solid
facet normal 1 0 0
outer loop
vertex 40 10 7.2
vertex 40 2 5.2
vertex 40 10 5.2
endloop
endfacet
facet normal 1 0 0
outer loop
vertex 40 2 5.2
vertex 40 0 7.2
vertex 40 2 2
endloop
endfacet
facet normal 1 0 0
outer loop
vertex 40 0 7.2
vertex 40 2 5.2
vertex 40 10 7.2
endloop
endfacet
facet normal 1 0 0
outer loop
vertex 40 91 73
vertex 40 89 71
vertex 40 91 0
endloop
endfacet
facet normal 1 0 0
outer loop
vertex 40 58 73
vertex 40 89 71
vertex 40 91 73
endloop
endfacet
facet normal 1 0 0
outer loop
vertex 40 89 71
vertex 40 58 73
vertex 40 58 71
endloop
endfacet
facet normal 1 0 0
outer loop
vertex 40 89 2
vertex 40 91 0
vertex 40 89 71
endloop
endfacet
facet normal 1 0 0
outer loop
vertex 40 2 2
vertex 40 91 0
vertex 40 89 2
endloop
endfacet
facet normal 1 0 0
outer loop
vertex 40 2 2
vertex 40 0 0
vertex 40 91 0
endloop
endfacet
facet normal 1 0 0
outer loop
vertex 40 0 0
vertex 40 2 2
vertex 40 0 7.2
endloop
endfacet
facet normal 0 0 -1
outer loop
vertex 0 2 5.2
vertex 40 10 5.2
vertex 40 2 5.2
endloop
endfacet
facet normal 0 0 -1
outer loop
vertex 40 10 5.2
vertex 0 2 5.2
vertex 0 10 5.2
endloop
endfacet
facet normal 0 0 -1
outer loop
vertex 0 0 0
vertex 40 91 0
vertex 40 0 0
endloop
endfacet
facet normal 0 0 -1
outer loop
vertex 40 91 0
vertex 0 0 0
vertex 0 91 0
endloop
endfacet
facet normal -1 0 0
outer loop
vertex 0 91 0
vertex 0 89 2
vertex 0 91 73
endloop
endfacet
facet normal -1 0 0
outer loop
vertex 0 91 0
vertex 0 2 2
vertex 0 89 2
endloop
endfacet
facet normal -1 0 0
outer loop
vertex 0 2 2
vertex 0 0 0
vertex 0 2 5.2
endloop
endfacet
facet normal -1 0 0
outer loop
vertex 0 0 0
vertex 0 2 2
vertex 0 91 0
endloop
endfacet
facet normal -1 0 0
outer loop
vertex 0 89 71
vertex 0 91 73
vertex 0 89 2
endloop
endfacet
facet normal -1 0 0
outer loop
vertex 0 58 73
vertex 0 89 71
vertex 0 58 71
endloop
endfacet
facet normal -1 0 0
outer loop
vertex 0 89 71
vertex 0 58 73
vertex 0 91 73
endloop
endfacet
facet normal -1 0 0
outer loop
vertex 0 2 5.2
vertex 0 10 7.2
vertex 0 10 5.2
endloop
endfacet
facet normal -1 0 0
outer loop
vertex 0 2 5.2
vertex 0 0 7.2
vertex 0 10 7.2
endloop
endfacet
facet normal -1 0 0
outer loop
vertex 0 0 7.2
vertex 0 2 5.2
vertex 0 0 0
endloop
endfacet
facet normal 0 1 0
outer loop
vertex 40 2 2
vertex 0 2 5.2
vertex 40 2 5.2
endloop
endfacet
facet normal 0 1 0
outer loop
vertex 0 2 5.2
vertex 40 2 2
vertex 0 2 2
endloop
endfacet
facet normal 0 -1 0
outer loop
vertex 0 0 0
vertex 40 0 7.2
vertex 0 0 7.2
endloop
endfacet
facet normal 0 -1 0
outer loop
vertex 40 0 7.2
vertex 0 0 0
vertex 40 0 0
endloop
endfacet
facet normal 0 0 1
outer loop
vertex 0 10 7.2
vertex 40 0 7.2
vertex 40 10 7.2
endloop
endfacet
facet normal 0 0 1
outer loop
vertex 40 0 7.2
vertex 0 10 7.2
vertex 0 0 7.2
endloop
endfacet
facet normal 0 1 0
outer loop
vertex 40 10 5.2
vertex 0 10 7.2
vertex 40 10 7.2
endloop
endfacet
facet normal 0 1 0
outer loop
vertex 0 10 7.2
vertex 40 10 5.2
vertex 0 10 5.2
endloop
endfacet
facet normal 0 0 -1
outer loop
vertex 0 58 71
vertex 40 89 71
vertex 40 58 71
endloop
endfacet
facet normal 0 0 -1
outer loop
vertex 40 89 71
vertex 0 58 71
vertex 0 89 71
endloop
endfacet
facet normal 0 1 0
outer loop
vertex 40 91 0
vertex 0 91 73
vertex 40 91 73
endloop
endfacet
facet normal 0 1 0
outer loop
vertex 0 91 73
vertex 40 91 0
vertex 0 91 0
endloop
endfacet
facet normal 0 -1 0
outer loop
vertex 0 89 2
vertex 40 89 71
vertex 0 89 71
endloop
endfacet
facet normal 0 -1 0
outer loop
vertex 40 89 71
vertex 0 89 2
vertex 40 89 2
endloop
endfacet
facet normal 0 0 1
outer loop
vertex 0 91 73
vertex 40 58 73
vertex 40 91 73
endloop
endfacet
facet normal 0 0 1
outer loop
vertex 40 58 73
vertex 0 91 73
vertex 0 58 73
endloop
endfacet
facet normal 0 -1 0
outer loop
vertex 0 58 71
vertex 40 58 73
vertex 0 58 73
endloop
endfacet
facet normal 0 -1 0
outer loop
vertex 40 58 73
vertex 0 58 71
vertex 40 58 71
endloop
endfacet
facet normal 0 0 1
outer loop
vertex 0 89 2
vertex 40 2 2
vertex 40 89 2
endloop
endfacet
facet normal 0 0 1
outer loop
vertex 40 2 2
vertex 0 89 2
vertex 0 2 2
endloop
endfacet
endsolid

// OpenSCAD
// Render Control
$fa = 1;
$fs = 0.4;

// Dimensions
width = 40;
height = 87;
depth_plate = 2;
depth_front = 5.2;
depth_rear = 71;
overhang_rear = 31;
overhang_front = 10;

// Modules
module base() {
  cube ([width, height + (2 * depth_plate), depth_plate]);
}

module front() {
  cube ([width, depth_plate, depth_front]);

  translate ([0, 0, depth_front]) {
    cube ([width, overhang_front, depth_plate]);
  }
}

module rear() {
  cube ([width, depth_plate, depth_rear]);

  translate ([0, -overhang_rear, depth_rear]) {
    cube ([width, overhang_rear + depth_plate, depth_plate]);
  }
}

// Model

render () {
  base ();

  front ();

  translate ([0, depth_plate + height, 0]) {
    rear ();
  }
}
